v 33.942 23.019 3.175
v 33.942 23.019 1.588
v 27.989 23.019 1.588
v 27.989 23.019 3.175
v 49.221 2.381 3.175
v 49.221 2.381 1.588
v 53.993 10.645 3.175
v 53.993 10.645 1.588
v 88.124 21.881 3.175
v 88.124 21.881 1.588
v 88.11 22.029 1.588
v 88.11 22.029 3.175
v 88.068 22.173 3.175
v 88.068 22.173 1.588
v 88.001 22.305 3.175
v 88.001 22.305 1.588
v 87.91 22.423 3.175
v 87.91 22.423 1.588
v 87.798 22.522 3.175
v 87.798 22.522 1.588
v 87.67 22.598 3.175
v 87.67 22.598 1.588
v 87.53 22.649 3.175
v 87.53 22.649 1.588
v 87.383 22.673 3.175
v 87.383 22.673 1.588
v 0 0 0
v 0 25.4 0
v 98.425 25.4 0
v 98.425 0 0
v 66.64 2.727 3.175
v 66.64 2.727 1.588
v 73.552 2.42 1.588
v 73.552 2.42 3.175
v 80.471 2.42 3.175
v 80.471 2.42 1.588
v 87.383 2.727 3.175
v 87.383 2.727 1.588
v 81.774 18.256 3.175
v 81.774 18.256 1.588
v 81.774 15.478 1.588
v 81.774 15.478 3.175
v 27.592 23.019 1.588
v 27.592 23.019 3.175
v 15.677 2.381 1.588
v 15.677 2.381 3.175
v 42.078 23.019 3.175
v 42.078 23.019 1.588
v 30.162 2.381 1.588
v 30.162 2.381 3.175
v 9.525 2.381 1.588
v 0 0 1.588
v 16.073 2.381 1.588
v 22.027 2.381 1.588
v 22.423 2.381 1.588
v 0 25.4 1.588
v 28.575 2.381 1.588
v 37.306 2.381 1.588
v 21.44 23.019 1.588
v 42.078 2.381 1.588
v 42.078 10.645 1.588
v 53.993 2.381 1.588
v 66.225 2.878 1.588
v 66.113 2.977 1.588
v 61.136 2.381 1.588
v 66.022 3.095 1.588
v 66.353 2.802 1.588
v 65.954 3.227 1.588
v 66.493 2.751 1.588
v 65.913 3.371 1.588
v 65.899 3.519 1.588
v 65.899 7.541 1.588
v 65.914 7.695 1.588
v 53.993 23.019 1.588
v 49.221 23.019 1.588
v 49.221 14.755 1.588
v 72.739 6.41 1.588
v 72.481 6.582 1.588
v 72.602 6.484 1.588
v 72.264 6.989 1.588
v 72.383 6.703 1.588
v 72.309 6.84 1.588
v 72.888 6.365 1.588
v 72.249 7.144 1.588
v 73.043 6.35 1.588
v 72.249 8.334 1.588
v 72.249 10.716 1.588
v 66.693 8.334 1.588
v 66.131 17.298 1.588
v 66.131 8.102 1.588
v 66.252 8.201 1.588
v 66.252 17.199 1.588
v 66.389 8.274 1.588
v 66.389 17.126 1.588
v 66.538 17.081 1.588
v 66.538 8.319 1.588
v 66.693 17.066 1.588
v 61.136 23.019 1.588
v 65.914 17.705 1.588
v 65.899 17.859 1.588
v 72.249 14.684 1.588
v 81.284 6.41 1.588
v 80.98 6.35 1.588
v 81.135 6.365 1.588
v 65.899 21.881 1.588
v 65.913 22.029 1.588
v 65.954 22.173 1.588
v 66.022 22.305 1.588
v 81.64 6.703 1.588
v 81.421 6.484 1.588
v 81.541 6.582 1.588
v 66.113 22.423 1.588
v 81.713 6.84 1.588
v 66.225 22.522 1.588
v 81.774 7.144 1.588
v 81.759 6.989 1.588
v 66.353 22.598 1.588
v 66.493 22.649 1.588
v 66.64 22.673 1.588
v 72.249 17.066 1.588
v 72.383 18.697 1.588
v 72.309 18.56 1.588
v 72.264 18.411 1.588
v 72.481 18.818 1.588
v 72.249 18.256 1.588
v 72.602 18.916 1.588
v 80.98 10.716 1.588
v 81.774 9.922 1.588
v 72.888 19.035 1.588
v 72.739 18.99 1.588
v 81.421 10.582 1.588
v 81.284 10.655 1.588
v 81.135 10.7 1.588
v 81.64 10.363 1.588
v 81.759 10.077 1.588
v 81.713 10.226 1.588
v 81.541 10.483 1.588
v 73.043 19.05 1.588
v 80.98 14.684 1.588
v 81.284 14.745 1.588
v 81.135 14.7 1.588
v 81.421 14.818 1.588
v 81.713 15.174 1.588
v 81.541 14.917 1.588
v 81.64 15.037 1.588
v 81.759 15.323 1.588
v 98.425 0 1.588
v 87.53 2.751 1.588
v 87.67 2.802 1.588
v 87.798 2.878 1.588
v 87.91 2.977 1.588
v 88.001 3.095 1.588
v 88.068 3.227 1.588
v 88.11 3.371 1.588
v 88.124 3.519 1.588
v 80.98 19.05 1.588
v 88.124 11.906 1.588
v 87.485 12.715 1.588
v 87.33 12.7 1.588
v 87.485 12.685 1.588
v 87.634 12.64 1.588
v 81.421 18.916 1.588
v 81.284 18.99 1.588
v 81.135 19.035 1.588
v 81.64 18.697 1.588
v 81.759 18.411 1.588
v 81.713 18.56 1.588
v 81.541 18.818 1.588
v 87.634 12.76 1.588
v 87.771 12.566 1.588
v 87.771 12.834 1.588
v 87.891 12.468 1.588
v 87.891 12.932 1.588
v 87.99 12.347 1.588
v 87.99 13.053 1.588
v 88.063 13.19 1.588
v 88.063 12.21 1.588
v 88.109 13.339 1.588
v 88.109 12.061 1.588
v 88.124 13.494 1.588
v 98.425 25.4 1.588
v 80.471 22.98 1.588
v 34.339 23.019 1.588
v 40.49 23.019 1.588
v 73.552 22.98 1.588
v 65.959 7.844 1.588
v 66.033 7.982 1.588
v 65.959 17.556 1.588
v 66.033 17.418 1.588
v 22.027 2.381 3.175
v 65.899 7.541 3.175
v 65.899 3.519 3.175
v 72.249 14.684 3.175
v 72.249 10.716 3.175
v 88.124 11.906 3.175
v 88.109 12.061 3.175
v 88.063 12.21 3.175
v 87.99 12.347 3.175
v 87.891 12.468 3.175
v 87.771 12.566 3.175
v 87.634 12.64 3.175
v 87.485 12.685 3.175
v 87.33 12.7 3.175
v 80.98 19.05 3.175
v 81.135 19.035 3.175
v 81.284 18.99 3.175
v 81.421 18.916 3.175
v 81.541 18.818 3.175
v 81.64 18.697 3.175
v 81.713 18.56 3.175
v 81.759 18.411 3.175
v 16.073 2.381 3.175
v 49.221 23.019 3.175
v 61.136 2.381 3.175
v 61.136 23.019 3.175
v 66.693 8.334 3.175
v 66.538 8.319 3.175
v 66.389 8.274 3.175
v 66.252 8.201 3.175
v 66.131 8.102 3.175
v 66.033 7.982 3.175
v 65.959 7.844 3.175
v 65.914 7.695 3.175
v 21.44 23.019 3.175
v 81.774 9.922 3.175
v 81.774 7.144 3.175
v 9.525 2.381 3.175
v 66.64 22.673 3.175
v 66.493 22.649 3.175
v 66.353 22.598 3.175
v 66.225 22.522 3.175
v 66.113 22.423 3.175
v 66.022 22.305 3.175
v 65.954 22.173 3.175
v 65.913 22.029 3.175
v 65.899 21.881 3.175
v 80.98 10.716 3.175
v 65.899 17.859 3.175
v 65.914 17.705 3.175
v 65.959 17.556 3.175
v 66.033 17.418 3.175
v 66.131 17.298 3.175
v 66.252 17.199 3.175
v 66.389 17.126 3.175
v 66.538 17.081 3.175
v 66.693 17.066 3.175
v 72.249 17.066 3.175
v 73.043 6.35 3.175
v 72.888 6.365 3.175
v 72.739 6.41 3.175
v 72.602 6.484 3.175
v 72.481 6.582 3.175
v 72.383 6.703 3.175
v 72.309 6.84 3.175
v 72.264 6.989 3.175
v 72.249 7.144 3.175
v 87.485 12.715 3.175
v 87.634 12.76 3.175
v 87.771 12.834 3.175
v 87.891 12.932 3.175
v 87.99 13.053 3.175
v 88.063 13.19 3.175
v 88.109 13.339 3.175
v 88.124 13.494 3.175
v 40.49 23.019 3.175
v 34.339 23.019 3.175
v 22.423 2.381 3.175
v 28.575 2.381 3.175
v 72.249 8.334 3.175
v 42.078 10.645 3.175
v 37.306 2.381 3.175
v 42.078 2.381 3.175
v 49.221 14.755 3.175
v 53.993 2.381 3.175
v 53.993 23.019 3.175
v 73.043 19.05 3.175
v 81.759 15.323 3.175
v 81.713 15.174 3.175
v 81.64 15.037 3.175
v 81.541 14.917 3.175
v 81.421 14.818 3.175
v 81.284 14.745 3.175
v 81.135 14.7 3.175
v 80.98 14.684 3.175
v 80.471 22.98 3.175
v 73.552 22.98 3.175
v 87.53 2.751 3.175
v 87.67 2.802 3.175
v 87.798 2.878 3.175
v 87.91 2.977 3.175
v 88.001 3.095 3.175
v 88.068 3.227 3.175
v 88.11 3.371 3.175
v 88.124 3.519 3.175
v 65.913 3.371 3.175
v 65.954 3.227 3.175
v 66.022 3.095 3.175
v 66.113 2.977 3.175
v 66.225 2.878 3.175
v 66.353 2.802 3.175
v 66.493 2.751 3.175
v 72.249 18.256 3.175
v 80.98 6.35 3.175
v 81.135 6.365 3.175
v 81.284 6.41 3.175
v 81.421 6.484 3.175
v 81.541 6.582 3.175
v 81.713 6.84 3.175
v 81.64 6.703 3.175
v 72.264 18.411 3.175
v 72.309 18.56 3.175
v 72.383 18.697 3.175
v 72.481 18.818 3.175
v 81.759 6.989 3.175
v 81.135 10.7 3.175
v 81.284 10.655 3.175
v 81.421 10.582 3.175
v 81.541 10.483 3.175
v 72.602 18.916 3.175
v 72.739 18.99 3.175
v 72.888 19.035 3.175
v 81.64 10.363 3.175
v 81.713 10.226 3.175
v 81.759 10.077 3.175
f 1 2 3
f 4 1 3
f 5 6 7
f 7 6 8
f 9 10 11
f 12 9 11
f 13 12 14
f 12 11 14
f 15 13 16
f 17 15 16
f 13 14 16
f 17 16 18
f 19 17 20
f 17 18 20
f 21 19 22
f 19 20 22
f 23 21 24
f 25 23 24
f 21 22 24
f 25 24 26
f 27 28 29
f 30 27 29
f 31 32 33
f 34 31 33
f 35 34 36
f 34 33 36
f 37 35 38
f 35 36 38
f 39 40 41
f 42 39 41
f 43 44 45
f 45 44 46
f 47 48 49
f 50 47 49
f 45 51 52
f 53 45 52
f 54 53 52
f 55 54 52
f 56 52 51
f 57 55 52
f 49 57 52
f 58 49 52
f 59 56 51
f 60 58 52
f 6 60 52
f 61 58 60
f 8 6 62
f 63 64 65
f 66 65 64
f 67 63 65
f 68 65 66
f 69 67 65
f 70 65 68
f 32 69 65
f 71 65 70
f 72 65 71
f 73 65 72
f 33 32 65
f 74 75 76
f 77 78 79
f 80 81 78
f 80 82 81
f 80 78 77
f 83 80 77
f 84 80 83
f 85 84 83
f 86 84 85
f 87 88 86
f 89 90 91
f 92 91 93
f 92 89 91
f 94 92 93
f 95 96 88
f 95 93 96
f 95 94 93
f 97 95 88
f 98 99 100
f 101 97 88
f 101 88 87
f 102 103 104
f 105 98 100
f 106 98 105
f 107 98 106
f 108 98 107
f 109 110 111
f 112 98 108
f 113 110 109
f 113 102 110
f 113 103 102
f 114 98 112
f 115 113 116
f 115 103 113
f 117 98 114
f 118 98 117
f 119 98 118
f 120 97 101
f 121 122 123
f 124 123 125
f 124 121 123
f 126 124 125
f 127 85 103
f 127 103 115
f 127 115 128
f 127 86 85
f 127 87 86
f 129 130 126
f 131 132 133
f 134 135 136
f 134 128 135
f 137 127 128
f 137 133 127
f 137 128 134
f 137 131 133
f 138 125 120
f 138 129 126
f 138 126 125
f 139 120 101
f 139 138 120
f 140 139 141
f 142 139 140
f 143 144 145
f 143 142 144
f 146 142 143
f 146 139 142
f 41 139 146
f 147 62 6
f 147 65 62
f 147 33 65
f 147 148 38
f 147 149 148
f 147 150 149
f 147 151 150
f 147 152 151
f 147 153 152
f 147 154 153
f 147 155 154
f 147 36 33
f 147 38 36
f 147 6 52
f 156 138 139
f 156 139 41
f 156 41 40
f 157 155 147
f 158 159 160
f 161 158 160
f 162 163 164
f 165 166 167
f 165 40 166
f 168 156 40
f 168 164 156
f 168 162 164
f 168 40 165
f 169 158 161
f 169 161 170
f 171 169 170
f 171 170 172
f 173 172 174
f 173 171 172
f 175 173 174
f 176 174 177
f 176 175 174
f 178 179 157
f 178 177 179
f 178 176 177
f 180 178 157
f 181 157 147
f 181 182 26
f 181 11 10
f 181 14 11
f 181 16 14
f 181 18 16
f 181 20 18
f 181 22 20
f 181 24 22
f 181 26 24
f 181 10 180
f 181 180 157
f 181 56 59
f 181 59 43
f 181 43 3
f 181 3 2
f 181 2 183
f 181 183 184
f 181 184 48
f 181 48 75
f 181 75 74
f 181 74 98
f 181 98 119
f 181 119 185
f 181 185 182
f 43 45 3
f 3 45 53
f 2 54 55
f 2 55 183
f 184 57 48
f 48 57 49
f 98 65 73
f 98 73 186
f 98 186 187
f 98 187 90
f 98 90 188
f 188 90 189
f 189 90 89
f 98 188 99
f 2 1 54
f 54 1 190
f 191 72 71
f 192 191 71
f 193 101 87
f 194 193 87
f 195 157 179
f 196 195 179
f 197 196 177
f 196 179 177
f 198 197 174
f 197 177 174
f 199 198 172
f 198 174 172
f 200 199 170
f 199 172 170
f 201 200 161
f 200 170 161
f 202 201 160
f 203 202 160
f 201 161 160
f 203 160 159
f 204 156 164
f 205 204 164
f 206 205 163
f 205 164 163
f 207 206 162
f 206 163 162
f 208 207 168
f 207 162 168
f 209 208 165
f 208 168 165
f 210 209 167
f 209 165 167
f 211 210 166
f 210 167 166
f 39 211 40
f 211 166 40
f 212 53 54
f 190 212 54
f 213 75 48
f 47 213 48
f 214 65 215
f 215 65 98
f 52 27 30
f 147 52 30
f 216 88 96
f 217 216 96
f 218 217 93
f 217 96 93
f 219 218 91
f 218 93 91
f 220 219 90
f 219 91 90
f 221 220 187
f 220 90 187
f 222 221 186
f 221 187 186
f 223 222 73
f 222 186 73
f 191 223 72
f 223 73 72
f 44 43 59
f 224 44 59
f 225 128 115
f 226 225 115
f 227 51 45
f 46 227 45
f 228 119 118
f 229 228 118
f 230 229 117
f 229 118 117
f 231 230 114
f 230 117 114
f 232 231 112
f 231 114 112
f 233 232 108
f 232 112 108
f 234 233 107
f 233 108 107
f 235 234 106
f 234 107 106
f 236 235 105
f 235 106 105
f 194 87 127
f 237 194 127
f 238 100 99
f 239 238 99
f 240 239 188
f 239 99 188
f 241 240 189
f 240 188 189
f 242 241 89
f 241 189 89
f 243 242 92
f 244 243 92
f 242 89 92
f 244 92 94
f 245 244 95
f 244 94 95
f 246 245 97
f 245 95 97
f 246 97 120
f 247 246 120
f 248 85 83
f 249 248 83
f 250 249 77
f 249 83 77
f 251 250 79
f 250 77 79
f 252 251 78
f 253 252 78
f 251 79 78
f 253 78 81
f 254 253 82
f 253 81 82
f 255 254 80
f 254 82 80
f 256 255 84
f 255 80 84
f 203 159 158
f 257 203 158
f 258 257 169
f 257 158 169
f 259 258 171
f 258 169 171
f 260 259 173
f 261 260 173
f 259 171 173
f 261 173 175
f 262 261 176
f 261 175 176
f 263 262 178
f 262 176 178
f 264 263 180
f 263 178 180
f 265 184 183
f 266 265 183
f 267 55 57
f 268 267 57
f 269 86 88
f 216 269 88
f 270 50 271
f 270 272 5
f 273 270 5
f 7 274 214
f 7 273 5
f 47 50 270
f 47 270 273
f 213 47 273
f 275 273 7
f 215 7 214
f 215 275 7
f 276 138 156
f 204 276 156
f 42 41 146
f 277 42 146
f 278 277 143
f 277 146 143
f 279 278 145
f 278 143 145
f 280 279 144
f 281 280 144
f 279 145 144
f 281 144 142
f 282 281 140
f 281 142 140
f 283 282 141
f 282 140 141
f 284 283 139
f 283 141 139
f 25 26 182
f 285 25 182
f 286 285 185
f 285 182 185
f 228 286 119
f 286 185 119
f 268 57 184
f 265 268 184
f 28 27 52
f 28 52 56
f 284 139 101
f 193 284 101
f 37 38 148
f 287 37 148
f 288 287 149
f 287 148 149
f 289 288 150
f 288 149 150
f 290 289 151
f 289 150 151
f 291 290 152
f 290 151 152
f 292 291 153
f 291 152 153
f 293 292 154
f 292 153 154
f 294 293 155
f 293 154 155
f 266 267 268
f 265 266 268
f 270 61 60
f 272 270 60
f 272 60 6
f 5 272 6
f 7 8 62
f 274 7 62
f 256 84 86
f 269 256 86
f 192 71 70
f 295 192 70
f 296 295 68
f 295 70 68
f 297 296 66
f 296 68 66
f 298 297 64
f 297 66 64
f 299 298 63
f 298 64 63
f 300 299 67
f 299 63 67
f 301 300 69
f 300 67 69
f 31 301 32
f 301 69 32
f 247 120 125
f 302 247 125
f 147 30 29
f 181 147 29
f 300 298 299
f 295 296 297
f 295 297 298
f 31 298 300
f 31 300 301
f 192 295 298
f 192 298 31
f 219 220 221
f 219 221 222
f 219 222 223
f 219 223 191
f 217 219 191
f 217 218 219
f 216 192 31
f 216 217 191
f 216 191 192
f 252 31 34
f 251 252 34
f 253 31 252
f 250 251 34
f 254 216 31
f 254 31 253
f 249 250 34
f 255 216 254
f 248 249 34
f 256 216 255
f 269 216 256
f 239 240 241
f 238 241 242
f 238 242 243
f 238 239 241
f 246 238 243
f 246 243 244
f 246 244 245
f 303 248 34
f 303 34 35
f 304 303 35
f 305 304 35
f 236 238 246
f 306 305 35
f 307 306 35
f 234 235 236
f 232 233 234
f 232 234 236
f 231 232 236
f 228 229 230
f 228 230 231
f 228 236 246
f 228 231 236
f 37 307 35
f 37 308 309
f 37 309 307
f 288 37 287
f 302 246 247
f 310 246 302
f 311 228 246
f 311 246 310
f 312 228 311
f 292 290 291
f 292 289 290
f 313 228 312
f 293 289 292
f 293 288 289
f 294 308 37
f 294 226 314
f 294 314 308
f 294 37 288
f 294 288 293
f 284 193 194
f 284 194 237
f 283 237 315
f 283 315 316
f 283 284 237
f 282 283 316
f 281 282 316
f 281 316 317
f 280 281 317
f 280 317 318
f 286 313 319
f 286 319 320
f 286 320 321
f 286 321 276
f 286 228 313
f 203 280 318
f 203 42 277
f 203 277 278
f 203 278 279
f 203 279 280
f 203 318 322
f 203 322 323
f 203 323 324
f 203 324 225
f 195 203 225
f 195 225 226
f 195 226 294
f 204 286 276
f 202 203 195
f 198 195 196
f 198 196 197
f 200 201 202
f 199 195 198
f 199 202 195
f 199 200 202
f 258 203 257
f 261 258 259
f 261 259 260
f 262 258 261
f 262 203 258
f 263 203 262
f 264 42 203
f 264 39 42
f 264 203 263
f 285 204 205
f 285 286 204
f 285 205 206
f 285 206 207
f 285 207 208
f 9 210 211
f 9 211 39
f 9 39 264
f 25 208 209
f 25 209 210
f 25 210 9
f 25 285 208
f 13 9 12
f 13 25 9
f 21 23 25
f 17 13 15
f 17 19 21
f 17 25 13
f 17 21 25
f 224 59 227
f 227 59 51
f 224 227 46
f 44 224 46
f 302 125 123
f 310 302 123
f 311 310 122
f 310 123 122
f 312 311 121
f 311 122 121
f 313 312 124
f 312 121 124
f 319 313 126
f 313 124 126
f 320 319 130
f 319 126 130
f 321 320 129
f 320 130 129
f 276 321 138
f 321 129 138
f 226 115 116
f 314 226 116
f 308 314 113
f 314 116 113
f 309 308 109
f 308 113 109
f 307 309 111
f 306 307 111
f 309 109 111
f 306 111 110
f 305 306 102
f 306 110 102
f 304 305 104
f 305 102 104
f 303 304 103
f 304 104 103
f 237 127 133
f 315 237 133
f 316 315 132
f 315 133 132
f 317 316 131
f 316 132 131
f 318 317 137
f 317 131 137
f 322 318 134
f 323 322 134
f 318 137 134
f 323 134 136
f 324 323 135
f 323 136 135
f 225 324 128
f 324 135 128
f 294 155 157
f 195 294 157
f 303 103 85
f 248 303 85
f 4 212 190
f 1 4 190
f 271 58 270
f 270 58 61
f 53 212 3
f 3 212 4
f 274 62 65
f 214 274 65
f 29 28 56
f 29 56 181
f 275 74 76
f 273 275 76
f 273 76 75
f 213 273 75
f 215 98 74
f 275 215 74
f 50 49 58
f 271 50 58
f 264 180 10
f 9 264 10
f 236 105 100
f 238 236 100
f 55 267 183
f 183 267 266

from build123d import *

# Parameters (mm, degrees)
F0_W     = 98.425
F0_H     = 25.4
F1_DEPTH = 1.5875
F3_DEPTH = 1.5875
F6_DEPTH = 1.5875
F5_ANGLE = -90


with BuildPart() as f1:
    # F0 (on Front) → F1 (new body)
    with BuildSketch(Plane.XZ):
        with Locations((49.2125, 12.7)):
            Rectangle(F0_W, F0_H)
    extrude(amount=F1_DEPTH)

    # F2 (on face) → F3 (join)
    with BuildSketch(Plane.XZ.offset(1.5875)):
        Polygon((21.4400661804, 23.01875), (9.525, 2.38125), (28.575, 2.38125), (40.4900661804, 23.01875), align=None)
        Polygon((42.0775661804, 23.01875), (30.1625, 2.38125), (37.30625, 2.38125), (42.0775661804, 10.6454120434), (42.0775661804, 2.38125), (49.2213161804, 2.38125), (53.9926323608, 10.6454120434), (53.9926323608, 2.38125), (61.1363823608, 2.38125), (61.1363823608, 23.01875), (53.9926323608, 23.01875), (49.2213161804, 14.7545879566), (49.2213161804, 23.01875), align=None)
        with BuildLine():
            ThreePointArc((66.6397834492, 22.6730891893), (66.1129825156, 22.4233597915), (65.8988823608, 21.8811005183))
            Line((65.8988823608, 21.8811005183), (65.8988823608, 17.859375))
            ThreePointArc((65.8988823608, 17.859375), (66.1313663532, 17.2981089924), (66.6926323608, 17.065625))
            Line((66.6926323608, 17.065625), (72.2488823608, 17.065625))
            Line((72.2488823608, 17.065625), (72.2488823608, 18.25625))
            ThreePointArc((72.2488823608, 18.25625), (72.4813663532, 18.8175160076), (73.0426323608, 19.05))
            Line((73.0426323608, 19.05), (80.9801323608, 19.05))
            ThreePointArc((80.9801323608, 19.05), (81.5413983684, 18.8175160076), (81.7738823608, 18.25625))
            Line((81.7738823608, 18.25625), (81.7738823608, 15.478125))
            ThreePointArc((81.7738823608, 15.478125), (81.5413983684, 14.9168589924), (80.9801323608, 14.684375))
            Line((80.9801323608, 14.684375), (72.2488823608, 14.684375))
            Line((72.2488823608, 14.684375), (72.2488823608, 10.715625))
            Line((72.2488823608, 10.715625), (80.9801323608, 10.715625))
            ThreePointArc((80.9801323608, 10.715625), (81.5413983684, 10.4831410076), (81.7738823608, 9.921875))
            Line((81.7738823608, 9.921875), (81.7738823608, 7.14375))
            ThreePointArc((81.7738823608, 7.14375), (81.5413983684, 6.5824839924), (80.9801323608, 6.35))
            Line((80.9801323608, 6.35), (73.0426323608, 6.35))
            ThreePointArc((73.0426323608, 6.35), (72.4813663532, 6.5824839924), (72.2488823608, 7.14375))
            Line((72.2488823608, 7.14375), (72.2488823608, 8.334375))
            Line((72.2488823608, 8.334375), (66.6926323608, 8.334375))
            ThreePointArc((66.6926323608, 8.334375), (66.1313663532, 8.1018910076), (65.8988823608, 7.540625))
            Line((65.8988823608, 7.540625), (65.8988823608, 3.5188994817))
            ThreePointArc((65.8988823608, 3.5188994817), (66.1129825156, 2.9766402085), (66.6397834492, 2.7269108107))
            ThreePointArc((66.6397834492, 2.7269108107), (77.0113823608, 2.38125), (87.3829812725, 2.7269108107))
            ThreePointArc((87.3829812725, 2.7269108107), (87.909782206, 2.9766402085), (88.1238823608, 3.5188994817))
            Line((88.1238823608, 3.5188994817), (88.1238823608, 11.90625))
            ThreePointArc((88.1238823608, 11.90625), (87.8913983684, 12.4675160076), (87.3301323608, 12.7))
            ThreePointArc((87.3301323608, 12.7), (87.8913983684, 12.9324839924), (88.1238823608, 13.49375))
            Line((88.1238823608, 13.49375), (88.1238823608, 16.8671875))
            Line((88.1238823608, 16.8671875), (88.1238823608, 21.8811005183))
            ThreePointArc((88.1238823608, 21.8811005183), (87.909782206, 22.4233597915), (87.3829812725, 22.6730891893))
            ThreePointArc((87.3829812725, 22.6730891893), (77.0113823608, 23.01875), (66.6397834492, 22.6730891893))
        make_face()
    extrude(amount=F3_DEPTH)

    # F4 (on face) → F6 (cut, through all)
    with BuildSketch(Plane.XZ.offset(3.175)):
        Polygon((22.4234375, 2.38125), (34.3385036804, 23.01875), (33.9416286804, 23.01875), (22.0265625, 2.38125), align=None)
        Polygon((16.0734375, 2.38125), (27.9885036804, 23.01875), (27.5916286804, 23.01875), (15.6765625, 2.38125), align=None)
    extrude(amount=-F6_DEPTH, mode=Mode.SUBTRACT)


with BuildPart() as f1_1:
    # F5: moved
    add(f1.part.rotate(Axis((49.2125, 0, 0), (1, 0, 0)), F5_ANGLE))


solid = f1_1.part
